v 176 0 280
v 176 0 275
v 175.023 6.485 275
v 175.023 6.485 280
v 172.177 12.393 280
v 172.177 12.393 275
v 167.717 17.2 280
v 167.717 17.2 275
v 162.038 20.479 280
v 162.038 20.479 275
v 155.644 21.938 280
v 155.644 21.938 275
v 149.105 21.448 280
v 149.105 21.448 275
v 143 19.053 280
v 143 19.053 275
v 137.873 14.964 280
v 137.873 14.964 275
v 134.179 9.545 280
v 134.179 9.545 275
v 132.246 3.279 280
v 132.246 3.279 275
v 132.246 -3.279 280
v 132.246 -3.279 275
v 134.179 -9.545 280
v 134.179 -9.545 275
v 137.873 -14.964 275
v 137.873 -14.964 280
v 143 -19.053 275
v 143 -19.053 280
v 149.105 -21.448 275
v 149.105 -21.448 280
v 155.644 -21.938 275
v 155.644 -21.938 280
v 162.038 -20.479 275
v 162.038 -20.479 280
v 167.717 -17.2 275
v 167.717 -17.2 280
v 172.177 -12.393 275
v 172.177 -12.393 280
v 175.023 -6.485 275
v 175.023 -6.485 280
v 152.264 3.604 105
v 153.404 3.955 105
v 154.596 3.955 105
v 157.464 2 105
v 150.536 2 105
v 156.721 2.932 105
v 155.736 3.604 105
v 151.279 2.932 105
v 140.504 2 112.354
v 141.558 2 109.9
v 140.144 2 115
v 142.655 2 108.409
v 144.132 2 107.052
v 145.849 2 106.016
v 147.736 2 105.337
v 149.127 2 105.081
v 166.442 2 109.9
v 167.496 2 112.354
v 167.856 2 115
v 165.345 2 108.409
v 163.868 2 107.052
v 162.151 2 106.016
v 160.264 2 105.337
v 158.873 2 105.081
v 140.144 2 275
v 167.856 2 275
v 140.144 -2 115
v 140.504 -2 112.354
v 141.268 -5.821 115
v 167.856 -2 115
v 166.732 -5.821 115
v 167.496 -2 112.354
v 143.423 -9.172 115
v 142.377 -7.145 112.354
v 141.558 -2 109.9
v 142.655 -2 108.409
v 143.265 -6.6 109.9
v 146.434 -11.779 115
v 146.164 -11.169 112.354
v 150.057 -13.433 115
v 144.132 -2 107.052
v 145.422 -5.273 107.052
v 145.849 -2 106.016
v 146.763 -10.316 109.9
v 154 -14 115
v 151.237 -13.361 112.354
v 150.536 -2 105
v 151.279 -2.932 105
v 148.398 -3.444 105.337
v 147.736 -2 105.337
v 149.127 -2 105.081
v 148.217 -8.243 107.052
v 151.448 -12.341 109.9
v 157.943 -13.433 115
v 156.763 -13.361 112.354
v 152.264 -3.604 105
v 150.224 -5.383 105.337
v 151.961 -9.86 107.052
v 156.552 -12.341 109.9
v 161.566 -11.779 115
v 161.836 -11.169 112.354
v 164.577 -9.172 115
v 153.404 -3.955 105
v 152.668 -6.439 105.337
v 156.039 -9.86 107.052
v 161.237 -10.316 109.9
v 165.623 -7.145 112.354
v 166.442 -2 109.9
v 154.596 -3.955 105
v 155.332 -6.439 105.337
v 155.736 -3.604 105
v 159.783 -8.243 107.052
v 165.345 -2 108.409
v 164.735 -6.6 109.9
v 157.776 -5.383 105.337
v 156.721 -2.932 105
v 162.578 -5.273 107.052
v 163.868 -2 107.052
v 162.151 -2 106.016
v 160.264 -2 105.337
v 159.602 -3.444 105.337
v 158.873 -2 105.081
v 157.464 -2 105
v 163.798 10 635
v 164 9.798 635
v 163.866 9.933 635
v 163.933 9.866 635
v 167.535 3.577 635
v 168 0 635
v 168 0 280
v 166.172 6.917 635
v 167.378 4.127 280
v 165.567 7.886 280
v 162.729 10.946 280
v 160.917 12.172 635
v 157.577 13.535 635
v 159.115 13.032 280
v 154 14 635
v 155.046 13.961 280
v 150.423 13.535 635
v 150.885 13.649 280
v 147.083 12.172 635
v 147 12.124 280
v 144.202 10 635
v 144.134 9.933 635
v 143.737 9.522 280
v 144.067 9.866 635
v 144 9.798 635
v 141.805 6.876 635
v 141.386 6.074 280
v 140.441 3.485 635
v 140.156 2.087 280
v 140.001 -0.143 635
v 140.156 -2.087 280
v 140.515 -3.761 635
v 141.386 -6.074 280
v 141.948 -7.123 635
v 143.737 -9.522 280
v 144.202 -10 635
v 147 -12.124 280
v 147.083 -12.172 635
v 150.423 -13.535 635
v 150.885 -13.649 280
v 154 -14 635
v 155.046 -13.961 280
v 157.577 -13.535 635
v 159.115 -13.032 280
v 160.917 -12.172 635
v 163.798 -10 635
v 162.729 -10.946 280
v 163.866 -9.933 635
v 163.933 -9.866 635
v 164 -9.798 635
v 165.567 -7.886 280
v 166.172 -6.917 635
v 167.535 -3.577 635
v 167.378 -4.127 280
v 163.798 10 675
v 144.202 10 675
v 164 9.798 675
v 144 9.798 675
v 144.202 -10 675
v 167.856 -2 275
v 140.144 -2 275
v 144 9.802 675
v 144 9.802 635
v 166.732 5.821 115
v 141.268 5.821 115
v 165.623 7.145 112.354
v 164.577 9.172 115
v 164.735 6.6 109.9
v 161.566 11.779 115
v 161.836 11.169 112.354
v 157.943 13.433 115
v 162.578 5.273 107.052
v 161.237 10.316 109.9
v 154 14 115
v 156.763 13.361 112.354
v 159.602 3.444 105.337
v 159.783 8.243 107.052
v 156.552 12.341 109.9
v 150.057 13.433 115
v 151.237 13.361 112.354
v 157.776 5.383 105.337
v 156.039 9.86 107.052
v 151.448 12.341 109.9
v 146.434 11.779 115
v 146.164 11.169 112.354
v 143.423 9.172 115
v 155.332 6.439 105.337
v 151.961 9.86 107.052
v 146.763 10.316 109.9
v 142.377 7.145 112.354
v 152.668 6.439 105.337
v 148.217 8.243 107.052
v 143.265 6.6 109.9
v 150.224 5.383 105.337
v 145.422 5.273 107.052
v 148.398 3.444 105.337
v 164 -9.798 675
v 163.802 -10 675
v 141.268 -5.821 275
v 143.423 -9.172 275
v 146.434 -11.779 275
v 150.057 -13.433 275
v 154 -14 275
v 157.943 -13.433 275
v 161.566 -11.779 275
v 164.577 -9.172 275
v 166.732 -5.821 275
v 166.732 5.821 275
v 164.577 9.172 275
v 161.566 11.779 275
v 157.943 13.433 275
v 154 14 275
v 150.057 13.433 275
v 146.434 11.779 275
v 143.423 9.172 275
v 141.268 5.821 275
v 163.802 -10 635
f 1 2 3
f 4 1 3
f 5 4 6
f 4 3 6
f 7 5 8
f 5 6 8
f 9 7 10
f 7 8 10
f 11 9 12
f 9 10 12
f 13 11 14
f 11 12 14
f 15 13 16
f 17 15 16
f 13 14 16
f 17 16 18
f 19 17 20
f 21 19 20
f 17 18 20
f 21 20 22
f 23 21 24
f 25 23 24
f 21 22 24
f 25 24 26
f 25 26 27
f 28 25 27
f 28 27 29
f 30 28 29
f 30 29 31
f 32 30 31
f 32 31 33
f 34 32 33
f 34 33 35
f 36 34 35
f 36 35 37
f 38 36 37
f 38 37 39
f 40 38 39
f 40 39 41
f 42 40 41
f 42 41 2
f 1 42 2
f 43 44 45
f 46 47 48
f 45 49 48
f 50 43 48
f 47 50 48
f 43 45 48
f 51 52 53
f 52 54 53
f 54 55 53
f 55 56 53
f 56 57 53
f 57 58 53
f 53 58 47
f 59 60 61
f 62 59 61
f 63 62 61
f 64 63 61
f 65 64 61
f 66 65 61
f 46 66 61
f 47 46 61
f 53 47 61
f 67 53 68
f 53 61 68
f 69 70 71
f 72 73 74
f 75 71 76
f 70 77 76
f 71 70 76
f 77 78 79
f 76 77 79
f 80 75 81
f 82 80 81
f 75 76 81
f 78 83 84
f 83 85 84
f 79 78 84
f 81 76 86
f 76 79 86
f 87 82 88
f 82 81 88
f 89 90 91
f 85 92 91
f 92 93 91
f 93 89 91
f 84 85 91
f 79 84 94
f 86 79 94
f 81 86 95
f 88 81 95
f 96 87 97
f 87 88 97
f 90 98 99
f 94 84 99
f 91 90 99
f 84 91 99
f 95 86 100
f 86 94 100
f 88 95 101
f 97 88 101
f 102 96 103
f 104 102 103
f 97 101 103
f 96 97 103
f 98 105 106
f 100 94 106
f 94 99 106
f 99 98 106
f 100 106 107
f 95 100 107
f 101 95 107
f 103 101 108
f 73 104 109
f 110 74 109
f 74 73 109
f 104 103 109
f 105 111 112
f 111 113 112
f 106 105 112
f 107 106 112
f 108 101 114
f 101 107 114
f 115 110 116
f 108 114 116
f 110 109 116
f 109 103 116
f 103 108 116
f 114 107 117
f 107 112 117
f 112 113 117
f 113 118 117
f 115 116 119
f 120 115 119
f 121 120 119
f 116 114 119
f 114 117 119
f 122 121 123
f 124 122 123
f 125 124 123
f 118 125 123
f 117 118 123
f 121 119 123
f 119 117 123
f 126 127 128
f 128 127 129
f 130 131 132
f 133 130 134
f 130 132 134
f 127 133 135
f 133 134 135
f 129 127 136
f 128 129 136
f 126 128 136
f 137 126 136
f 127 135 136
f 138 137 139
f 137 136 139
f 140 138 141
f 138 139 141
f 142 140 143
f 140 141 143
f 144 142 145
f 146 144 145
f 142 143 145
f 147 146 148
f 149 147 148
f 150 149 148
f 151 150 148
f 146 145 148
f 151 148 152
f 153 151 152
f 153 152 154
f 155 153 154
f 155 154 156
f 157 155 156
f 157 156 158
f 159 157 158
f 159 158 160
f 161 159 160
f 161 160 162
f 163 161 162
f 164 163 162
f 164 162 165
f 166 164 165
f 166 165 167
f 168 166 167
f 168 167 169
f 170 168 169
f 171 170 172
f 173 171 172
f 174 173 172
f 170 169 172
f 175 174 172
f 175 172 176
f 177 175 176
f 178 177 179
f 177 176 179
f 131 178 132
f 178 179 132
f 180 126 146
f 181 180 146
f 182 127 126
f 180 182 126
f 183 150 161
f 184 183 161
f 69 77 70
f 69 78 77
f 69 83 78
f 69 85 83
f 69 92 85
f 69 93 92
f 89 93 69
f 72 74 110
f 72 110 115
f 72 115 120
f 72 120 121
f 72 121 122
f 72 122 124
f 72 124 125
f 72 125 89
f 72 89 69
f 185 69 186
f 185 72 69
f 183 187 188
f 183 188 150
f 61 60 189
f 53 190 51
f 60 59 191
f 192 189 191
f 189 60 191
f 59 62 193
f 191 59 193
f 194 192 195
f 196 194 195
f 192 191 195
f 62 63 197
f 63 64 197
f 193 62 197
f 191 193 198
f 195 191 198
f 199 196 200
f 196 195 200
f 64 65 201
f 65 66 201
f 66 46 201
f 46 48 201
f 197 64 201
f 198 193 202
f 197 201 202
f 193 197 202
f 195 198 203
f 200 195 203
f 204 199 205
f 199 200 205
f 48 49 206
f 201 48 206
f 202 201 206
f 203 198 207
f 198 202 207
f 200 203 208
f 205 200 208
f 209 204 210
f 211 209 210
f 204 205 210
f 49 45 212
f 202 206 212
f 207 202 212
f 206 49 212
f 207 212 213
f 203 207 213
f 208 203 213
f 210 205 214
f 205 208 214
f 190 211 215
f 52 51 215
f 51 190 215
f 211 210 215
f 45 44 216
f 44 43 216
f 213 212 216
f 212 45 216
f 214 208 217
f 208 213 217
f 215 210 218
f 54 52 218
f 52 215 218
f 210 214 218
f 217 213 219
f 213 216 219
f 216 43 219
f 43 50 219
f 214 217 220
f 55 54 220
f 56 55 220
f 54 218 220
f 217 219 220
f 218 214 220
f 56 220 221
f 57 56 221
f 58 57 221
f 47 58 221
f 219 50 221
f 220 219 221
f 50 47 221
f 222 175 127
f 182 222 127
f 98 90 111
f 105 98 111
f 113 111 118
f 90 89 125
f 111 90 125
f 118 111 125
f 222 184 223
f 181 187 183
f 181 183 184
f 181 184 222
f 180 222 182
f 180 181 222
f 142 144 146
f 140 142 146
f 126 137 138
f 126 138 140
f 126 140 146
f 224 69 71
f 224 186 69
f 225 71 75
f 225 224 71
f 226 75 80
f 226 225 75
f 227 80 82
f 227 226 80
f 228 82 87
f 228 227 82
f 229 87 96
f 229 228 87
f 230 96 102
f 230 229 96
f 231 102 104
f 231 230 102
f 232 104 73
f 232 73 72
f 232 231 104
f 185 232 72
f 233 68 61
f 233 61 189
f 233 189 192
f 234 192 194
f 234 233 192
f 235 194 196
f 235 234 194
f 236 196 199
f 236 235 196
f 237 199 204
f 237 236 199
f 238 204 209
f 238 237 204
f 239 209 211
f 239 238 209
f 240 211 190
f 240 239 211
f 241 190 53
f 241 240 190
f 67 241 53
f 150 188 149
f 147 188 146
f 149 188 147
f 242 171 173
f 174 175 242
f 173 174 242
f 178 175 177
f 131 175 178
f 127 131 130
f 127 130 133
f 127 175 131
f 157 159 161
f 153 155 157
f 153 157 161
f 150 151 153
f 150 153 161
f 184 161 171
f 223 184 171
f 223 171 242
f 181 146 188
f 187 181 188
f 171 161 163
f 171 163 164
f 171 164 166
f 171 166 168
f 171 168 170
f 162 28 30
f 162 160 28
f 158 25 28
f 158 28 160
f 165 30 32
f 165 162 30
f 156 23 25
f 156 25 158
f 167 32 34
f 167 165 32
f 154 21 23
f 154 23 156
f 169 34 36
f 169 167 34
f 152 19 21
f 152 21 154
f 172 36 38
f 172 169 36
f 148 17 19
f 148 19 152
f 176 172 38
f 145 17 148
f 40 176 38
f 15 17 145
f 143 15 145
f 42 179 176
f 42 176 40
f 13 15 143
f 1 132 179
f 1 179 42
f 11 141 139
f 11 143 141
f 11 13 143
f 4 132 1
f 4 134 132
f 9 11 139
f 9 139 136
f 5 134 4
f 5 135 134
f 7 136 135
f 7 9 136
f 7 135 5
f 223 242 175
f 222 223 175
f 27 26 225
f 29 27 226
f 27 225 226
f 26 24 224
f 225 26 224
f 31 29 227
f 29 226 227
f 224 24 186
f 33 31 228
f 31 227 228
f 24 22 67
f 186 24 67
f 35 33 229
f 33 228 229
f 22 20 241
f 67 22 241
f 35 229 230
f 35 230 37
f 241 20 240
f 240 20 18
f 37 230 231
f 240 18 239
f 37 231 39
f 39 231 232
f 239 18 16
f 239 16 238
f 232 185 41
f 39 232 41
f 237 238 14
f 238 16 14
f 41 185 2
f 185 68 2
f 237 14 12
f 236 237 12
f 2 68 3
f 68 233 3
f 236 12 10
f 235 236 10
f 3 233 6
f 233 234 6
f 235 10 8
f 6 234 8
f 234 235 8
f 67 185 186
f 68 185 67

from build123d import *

# Parameters (mm, degrees)
F1_R           = 22
F2_DEPTH       = 5
F3_R           = 14
F4_DEPTH       = 355
F4_DEPTH_BACK  = 175
F6_DEPTH       = 40
F7_R           = 10
F9_W           = 4
F9_H           = 175
F10_DEPTH      = 43.001
F10_DEPTH_BACK = 25


with BuildPart() as f2:
    # F1 (on offset) → F2 (new body)
    with BuildSketch(Plane.XY.offset(275)):
        with Locations((154, 0)):
            Circle(F1_R)
    extrude(amount=F2_DEPTH)

    # F3 (on face) → F4 (join, two sides)
    with BuildSketch(Plane.XY.offset(280)) as f4_sk:
        with Locations((154, 0)):
            Circle(F3_R)
    extrude(amount=F4_DEPTH)
    extrude(f4_sk.sketch, amount=-F4_DEPTH_BACK)

    # F5 (on face) → F6 (join)
    with BuildSketch(Plane.XY.offset(635)):
        Polygon((164, 9.7979589711), (163.7979589711, 10), (144.2020410289, 10), (144, 9.8020410289), (144, 9.7979589711), (144.2020410289, -10), (163.8020410289, -10), (164, -9.7979589711), align=None)
    extrude(amount=F6_DEPTH)

    # F7
    f7_edges = [f2.edges().sort_by_distance(p)[0] for p in [
        (140, 0, 105),
    ]]
    fillet(f7_edges, radius=F7_R)

    # F9 (on offset) → F10 (cut, two sides)
    with BuildSketch(Plane.YZ.offset(175)) as f10_sk:
        with Locations((0, 187.5)):
            Rectangle(F9_W, F9_H)
    extrude(amount=-F10_DEPTH, mode=Mode.SUBTRACT)
    extrude(f10_sk.sketch, amount=F10_DEPTH_BACK, mode=Mode.SUBTRACT)


solid = f2.part
